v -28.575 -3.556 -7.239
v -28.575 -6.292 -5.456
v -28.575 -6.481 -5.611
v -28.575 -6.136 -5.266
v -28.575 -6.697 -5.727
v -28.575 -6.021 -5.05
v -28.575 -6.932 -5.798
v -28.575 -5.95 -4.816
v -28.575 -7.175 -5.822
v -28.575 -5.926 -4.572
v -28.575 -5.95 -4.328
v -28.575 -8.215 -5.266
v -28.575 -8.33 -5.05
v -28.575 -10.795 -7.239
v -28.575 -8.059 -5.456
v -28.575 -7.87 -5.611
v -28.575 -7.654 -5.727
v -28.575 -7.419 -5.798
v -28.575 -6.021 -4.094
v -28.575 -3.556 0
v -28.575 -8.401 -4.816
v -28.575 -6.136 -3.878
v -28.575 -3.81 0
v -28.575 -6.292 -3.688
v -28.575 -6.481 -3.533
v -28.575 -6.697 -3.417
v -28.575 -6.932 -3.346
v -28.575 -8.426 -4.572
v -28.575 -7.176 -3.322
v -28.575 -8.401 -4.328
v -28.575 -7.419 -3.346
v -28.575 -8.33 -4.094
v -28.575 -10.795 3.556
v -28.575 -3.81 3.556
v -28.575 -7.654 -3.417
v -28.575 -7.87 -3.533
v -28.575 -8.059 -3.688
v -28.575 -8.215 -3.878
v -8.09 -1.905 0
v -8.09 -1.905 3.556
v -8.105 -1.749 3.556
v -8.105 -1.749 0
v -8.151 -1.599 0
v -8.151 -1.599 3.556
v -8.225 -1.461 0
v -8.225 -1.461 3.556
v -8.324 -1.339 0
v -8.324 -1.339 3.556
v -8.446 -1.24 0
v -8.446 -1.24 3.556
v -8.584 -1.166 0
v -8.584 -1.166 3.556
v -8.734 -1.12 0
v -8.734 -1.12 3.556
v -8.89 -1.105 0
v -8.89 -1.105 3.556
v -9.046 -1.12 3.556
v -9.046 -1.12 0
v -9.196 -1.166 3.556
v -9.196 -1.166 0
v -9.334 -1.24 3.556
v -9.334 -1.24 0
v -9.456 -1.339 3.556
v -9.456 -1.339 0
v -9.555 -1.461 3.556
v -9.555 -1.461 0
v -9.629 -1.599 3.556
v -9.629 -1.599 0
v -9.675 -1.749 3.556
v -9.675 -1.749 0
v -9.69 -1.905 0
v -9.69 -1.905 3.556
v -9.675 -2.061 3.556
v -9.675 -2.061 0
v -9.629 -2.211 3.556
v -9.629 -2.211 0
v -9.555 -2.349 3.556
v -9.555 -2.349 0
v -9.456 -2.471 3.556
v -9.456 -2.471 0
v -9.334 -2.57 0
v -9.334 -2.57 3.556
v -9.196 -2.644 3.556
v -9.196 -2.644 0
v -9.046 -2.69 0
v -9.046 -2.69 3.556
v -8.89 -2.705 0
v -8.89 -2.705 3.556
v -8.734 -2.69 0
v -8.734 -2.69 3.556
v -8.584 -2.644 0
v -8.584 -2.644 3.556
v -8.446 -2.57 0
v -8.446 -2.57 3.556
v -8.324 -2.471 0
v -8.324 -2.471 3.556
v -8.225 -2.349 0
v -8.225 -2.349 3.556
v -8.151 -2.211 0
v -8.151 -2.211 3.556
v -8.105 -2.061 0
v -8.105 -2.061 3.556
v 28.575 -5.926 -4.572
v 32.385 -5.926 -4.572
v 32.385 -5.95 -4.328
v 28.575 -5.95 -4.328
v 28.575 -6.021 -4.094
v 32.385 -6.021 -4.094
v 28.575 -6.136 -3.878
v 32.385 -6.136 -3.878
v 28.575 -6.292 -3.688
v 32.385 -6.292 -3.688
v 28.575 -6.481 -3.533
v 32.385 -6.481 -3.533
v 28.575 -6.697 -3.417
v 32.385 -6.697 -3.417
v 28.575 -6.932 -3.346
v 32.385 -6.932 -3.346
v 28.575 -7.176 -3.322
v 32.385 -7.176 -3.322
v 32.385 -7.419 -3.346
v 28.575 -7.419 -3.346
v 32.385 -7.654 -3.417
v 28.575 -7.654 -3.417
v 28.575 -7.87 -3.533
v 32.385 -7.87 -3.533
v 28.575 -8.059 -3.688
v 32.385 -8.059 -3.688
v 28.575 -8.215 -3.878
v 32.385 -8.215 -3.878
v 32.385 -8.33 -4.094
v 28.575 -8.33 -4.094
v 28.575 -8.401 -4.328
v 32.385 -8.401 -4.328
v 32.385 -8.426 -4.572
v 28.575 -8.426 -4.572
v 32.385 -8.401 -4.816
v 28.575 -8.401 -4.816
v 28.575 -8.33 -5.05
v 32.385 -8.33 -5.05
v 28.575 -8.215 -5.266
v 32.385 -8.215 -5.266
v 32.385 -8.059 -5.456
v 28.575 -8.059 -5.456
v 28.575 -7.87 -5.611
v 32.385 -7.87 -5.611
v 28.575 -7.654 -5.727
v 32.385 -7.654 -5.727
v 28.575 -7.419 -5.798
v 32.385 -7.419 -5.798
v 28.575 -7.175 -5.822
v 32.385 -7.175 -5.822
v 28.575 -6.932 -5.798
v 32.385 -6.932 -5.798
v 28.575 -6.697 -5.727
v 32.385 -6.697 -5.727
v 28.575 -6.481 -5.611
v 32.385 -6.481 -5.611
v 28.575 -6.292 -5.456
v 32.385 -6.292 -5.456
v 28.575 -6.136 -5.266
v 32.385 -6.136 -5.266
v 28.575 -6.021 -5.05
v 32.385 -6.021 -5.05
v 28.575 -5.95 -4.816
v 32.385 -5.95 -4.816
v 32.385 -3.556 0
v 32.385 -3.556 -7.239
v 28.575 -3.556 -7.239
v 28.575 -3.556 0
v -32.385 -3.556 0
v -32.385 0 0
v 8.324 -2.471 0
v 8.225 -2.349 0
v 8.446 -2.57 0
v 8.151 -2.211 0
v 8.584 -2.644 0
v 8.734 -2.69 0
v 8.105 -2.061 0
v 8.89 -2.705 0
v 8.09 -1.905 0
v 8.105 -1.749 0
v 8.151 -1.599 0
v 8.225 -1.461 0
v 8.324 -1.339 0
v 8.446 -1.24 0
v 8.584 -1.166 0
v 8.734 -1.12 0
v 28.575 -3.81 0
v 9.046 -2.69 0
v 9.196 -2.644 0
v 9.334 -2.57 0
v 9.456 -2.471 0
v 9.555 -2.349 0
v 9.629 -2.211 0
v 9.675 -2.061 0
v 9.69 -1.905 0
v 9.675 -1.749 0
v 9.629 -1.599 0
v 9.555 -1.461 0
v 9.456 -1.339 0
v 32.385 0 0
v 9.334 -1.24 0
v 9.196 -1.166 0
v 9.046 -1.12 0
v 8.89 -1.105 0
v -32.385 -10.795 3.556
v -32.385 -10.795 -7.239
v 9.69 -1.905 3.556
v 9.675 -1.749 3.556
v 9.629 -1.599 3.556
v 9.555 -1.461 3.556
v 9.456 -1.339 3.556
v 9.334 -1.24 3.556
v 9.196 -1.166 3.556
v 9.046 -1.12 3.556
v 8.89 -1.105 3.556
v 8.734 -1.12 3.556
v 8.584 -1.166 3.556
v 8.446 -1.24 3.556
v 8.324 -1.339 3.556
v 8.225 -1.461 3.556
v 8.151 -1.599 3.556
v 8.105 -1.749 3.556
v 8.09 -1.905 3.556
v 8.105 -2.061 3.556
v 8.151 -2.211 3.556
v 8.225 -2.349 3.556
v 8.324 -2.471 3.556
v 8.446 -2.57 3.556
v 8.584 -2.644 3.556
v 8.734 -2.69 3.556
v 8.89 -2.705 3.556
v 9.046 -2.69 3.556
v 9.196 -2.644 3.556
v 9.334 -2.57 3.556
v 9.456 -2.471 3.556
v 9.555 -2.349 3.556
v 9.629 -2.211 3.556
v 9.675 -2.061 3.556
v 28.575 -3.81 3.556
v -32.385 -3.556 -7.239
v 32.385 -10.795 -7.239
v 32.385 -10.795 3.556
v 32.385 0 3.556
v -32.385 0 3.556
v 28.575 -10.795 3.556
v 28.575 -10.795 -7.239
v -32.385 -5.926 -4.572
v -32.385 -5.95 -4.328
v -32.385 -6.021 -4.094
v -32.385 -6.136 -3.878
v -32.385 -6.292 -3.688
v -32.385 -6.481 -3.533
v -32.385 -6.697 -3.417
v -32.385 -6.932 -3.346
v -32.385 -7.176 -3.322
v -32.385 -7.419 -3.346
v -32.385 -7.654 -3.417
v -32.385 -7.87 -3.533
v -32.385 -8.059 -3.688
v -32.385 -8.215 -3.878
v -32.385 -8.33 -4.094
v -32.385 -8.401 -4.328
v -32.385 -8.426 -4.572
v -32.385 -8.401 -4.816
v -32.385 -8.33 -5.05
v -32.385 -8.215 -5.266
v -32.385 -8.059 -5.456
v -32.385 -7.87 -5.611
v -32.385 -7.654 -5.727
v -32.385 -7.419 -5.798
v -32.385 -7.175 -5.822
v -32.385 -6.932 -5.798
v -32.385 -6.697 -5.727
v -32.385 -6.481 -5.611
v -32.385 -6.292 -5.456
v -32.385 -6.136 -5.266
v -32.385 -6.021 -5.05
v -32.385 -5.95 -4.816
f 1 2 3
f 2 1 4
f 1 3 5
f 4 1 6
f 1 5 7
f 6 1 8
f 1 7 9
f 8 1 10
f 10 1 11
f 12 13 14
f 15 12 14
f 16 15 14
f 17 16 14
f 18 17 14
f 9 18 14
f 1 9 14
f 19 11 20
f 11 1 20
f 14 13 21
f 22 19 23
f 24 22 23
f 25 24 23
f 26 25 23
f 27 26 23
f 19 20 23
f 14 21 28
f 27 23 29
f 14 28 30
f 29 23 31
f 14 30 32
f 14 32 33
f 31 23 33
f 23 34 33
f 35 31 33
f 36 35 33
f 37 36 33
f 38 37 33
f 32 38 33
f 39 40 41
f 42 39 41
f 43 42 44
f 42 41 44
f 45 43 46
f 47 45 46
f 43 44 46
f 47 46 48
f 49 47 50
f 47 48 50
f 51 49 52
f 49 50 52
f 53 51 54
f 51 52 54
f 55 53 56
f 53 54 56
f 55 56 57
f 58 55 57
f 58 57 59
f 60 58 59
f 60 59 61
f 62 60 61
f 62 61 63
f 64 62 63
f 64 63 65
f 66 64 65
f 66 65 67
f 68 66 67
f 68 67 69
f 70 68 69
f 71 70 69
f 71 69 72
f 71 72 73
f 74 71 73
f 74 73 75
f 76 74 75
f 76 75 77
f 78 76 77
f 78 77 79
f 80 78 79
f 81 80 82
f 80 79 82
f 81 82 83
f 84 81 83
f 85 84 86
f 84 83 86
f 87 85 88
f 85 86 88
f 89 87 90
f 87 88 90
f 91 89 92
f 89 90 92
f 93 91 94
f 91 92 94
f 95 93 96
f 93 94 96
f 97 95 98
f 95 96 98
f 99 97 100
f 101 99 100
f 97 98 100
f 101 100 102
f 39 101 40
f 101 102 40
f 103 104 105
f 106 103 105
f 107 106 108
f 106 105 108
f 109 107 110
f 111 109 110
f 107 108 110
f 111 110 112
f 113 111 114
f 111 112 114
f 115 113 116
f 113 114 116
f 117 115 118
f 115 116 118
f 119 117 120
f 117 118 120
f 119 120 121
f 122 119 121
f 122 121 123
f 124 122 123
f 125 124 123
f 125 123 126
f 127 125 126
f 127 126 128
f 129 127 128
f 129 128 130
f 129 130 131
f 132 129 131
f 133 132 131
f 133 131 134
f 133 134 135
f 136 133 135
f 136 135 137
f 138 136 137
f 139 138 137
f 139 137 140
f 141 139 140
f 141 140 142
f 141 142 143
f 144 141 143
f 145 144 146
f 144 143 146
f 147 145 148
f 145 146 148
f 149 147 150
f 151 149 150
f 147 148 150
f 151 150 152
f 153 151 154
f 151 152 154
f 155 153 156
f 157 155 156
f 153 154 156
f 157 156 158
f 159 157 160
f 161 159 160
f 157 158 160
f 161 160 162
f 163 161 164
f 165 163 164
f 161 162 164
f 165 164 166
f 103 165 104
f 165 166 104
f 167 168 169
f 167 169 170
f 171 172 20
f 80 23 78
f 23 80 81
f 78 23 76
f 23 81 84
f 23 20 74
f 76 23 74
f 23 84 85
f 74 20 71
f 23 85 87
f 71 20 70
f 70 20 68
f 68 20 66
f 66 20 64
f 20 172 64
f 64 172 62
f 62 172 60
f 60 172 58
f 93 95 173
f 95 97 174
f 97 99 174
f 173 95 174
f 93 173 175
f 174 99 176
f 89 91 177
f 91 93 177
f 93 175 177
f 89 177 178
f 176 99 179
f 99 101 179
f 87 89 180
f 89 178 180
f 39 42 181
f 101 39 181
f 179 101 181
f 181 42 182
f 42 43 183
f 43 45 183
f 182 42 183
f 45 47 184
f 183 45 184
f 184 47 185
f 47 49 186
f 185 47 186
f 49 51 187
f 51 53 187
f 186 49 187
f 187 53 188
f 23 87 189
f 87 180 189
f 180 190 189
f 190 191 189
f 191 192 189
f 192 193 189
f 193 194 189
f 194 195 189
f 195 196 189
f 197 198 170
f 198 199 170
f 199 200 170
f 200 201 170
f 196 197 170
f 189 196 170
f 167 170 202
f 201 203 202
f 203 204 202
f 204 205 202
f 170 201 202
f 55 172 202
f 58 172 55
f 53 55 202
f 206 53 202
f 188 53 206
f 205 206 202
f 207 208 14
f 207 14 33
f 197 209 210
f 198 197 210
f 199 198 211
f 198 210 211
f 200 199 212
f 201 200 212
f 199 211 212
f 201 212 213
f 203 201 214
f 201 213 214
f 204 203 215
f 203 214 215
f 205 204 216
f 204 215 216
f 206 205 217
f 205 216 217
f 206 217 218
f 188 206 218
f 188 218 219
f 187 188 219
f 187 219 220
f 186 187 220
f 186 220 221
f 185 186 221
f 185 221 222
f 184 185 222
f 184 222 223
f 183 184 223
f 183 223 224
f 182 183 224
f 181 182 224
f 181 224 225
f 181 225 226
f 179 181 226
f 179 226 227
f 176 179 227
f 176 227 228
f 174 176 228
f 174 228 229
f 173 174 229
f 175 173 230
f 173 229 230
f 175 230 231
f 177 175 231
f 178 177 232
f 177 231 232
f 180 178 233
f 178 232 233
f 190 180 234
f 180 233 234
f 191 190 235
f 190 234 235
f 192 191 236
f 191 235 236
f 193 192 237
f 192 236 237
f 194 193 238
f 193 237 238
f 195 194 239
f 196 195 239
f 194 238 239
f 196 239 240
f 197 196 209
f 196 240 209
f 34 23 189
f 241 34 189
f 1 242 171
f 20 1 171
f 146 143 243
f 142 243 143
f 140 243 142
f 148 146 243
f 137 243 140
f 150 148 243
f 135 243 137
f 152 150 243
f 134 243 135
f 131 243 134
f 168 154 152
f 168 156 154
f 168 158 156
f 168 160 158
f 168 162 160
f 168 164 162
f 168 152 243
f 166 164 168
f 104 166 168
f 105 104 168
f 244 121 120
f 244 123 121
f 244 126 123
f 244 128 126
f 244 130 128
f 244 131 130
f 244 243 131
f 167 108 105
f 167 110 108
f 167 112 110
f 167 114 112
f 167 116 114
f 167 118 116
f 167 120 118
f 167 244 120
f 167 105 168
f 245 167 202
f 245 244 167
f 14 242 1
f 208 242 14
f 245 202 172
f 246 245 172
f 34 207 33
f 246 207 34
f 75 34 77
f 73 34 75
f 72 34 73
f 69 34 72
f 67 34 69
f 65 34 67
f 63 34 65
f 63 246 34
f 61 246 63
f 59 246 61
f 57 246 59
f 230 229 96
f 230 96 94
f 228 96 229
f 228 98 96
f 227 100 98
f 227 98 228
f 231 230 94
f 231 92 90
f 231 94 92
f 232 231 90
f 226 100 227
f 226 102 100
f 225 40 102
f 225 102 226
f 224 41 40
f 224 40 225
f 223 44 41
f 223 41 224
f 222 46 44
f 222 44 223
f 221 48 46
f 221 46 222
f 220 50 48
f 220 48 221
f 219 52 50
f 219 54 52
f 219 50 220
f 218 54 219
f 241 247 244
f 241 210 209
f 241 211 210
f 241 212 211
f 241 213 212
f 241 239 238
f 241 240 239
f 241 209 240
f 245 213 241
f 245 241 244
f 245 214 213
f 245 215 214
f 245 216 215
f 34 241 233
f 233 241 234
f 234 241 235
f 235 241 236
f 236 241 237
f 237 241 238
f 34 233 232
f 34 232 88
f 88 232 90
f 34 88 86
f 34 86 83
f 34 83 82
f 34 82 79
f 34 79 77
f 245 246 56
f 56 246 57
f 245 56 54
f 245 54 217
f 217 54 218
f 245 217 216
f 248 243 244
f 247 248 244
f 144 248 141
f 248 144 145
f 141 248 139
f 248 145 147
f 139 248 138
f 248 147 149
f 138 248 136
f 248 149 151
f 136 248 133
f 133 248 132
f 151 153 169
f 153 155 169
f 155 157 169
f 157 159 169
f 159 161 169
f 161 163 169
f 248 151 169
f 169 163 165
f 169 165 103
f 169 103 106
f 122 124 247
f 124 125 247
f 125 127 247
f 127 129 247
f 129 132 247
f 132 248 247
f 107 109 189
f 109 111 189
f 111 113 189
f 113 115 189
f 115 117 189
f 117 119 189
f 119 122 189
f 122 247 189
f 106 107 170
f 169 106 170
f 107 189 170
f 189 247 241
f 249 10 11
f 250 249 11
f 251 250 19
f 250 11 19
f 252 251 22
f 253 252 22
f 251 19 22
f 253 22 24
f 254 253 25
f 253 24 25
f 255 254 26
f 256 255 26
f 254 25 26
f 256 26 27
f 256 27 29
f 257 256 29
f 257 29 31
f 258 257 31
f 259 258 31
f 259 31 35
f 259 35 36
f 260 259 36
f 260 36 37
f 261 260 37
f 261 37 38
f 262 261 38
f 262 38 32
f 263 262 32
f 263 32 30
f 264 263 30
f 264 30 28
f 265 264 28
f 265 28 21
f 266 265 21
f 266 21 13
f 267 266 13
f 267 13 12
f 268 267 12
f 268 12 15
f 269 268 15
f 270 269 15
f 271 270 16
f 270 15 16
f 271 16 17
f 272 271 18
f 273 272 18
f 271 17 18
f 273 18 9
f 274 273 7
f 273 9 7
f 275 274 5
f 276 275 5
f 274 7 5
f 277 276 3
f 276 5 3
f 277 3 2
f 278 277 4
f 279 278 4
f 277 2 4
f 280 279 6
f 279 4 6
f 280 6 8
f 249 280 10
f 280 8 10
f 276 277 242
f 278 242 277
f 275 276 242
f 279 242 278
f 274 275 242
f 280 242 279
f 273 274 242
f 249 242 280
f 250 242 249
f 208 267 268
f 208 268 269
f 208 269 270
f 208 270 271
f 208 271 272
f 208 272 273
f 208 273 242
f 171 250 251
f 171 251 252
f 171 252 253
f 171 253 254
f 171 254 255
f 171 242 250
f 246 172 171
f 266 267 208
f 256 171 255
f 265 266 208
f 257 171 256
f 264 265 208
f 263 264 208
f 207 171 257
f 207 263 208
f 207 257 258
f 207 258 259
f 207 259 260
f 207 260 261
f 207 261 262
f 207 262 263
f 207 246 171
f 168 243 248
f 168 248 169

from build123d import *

# Parameters (mm, degrees)
PAD_DEPTH     = 3.556
SKETCH001_W   = 7.239
SKETCH001_H   = 7.239
PAD001_DEPTH  = 3.81
SKETCH002_W   = 7.239
SKETCH002_H   = 7.239
PAD002_DEPTH  = 3.81
SKETCH003_R   = 1.25
HOLE_DEPTH    = 64.771
SKETCH004_R   = 0.8
HOLE001_DEPTH = 24.892


with BuildPart() as part:
    # Sketch → Pad (new body)
    with BuildSketch(Plane.XY):
        Polygon((-32.385, 0), (-32.385, -10.795), (-28.575, -10.795), (-28.575, -3.81), (28.575, -3.81), (28.575, -10.795), (32.385, -10.795), (32.385, 0), align=None)
    extrude(amount=PAD_DEPTH)

    # Sketch001 (on Face1 of Pad) → Pad001 (join)
    with BuildSketch(Plane(origin=(-32.385, 0, 0), x_dir=(0, -1, 0), z_dir=(-1, 0, 0))):
        with Locations((7.1755, -3.6195)):
            Rectangle(SKETCH001_W, SKETCH001_H)
    extrude(amount=-PAD001_DEPTH)

    # Sketch002 (on Face4 of Pad001) → Pad002 (join)
    with BuildSketch(Plane.YZ.offset(32.385)):
        with Locations((-7.1755, -3.6195)):
            Rectangle(SKETCH002_W, SKETCH002_H)
    extrude(amount=-PAD002_DEPTH)

    # Sketch003 (on Face12 of Pad002) → Hole (cut, through all)
    with BuildSketch(Plane.YZ.offset(32.385)):
        with Locations((-7.1755, -4.572)):
            Circle(SKETCH003_R)
    extrude(amount=-HOLE_DEPTH, mode=Mode.SUBTRACT)

    # Sketch004 (on Face5 of Hole) → Hole001 (cut)
    with BuildSketch(Plane.XY.offset(3.556)):
        with Locations((-8.89, -1.905)):
            Circle(SKETCH004_R)
        with Locations((8.89, -1.905)):
            Circle(SKETCH004_R)
    extrude(amount=-HOLE001_DEPTH, mode=Mode.SUBTRACT)


solid = part.part
